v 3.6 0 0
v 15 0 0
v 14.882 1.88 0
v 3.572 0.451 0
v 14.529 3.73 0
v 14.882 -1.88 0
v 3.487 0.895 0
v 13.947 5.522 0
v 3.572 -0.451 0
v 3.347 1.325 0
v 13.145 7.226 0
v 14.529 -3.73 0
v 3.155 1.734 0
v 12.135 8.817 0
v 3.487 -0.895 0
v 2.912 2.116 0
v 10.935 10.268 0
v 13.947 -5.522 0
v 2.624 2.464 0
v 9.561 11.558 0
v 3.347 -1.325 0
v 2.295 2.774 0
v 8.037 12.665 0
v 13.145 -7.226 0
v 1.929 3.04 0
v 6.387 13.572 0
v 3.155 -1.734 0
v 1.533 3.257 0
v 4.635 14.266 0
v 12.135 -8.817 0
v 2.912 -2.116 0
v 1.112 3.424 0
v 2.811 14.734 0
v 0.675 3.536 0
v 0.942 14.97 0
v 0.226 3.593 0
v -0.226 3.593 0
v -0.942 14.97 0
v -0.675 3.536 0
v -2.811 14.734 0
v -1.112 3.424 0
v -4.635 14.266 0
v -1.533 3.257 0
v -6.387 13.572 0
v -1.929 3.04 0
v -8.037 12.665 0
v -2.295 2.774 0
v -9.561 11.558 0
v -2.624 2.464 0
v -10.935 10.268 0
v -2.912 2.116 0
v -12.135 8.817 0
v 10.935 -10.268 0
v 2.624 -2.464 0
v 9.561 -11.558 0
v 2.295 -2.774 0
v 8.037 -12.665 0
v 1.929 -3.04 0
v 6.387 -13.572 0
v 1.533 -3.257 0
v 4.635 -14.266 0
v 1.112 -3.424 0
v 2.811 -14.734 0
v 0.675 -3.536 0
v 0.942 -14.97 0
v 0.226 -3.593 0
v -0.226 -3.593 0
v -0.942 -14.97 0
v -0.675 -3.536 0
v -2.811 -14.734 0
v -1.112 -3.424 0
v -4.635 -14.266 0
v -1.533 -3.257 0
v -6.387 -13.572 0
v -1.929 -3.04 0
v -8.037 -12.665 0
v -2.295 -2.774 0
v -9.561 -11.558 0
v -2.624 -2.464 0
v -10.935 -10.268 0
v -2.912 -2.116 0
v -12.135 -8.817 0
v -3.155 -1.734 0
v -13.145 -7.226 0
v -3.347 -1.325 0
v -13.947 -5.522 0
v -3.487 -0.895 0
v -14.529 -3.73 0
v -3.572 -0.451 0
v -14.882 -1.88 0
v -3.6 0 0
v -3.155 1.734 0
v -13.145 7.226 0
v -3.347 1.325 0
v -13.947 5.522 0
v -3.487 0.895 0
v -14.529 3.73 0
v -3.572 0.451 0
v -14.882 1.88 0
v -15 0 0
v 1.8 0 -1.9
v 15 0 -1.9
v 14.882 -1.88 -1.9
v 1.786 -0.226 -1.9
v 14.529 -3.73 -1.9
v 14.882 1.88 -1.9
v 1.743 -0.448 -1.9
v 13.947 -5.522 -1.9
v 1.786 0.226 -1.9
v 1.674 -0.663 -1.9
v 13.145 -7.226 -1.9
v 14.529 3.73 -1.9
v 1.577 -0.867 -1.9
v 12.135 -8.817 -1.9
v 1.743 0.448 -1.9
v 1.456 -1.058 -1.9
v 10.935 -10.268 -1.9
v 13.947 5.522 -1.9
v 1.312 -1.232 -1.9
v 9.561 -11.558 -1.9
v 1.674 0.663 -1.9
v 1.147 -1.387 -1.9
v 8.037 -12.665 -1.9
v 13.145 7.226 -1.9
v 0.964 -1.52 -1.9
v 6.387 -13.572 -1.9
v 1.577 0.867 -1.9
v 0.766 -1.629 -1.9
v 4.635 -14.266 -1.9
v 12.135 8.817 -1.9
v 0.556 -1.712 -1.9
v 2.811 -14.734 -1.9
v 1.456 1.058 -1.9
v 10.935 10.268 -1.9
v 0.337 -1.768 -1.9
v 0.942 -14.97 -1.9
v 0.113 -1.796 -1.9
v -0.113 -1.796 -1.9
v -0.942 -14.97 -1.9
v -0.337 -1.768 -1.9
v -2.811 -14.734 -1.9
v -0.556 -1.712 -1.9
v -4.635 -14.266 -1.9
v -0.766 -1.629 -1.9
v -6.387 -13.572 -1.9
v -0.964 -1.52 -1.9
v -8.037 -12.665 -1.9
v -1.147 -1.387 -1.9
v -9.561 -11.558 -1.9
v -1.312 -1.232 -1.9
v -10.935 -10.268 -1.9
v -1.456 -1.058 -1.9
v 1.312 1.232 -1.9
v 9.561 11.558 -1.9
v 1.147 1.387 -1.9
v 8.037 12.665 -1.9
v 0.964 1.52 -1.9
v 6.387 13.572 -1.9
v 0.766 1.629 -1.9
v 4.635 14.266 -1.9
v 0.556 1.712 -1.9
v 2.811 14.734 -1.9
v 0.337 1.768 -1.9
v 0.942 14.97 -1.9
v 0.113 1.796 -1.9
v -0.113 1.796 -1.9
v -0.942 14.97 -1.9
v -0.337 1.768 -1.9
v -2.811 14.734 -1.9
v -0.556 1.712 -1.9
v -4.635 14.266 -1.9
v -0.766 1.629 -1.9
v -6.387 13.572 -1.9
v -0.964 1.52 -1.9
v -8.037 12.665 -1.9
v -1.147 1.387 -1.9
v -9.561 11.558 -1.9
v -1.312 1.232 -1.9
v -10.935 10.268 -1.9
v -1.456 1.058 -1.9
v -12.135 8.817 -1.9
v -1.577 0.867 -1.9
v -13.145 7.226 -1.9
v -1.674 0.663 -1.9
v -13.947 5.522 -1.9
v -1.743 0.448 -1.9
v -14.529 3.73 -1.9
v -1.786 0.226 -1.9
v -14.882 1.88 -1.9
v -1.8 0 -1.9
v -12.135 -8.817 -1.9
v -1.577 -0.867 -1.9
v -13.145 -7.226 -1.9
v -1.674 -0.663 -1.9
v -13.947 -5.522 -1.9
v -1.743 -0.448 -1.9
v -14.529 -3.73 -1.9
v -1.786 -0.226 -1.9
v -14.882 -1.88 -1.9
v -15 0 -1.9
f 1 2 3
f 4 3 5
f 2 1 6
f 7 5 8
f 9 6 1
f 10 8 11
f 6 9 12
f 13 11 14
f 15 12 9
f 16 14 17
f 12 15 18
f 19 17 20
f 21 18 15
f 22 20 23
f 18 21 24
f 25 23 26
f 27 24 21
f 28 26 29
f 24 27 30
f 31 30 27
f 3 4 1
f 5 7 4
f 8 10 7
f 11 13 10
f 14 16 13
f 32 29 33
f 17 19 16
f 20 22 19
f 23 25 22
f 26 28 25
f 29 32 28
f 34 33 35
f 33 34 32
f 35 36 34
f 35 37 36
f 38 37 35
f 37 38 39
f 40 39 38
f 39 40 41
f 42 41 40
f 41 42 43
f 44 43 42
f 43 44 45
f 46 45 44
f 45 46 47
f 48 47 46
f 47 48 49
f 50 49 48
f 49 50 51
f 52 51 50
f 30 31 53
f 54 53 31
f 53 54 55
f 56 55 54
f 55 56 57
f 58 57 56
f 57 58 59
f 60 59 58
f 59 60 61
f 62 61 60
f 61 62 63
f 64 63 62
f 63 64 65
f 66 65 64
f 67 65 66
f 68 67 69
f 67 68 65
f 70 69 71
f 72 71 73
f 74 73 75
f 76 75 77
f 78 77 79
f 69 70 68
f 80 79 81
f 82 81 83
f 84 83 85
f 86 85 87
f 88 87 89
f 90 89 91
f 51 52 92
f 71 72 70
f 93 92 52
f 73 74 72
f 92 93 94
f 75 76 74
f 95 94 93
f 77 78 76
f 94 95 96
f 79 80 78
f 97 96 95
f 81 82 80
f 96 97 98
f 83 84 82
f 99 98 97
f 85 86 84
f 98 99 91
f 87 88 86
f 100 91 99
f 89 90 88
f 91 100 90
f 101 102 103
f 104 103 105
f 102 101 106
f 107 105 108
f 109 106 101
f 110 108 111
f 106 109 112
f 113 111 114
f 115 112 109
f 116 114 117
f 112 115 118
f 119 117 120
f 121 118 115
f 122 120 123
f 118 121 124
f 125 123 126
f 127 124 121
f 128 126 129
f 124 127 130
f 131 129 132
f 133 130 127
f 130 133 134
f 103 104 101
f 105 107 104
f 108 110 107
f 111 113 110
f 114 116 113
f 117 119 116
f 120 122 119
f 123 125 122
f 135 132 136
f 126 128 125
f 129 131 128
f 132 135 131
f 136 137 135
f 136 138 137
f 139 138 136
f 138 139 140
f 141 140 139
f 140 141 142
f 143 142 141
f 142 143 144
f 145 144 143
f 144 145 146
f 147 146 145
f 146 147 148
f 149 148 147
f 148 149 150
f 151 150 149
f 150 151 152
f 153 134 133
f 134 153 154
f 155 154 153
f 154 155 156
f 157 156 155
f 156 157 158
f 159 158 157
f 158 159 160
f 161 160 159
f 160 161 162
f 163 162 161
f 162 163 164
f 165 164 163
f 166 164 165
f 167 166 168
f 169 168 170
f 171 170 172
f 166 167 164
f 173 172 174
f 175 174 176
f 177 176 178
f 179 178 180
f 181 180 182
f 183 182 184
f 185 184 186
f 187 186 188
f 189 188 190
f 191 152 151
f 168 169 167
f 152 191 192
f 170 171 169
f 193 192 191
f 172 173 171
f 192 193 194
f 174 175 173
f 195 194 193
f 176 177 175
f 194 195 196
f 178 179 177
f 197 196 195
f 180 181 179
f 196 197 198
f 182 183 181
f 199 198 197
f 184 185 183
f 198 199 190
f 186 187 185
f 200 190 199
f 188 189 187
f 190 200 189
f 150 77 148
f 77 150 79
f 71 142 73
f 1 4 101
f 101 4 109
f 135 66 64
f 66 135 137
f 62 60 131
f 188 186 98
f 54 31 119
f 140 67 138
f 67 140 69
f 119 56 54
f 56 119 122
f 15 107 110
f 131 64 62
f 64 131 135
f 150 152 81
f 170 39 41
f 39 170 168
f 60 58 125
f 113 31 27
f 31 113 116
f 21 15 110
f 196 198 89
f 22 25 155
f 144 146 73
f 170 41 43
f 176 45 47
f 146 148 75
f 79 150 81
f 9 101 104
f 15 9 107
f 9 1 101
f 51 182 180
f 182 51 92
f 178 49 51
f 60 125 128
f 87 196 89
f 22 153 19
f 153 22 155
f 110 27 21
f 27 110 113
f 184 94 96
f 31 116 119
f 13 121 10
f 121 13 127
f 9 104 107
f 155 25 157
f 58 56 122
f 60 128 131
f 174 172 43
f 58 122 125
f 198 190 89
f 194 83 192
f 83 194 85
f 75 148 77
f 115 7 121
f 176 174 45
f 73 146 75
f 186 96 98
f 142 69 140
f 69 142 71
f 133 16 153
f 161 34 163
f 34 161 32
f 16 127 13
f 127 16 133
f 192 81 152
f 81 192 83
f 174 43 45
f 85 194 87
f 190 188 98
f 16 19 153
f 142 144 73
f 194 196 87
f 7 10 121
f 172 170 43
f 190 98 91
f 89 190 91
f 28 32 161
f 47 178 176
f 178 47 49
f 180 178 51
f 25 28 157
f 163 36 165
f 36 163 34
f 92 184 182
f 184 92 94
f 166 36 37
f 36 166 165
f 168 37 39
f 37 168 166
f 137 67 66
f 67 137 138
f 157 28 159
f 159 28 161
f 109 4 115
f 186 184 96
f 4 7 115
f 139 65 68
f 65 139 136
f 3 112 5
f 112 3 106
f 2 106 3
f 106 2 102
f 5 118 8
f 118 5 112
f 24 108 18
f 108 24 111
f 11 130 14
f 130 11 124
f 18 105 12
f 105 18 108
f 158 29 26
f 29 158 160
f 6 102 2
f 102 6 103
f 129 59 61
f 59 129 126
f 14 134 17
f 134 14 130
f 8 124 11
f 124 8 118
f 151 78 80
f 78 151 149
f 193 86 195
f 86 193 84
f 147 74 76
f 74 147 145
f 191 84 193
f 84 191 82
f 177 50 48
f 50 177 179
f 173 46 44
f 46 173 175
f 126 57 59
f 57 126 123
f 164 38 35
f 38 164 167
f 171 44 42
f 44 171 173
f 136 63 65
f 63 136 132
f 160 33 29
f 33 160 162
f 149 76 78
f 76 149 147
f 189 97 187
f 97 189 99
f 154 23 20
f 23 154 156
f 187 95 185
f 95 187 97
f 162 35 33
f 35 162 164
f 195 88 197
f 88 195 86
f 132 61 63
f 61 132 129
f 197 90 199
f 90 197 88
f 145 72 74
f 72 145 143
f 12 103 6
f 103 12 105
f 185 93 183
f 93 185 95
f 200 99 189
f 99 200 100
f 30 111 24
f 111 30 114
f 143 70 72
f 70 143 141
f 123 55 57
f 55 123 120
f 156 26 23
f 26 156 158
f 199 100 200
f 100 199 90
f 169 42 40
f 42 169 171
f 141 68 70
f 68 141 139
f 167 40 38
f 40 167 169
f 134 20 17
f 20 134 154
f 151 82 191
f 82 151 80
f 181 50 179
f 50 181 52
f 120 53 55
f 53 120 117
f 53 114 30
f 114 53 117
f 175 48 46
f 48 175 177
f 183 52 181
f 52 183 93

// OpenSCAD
$fn = 50;


difference() {
	union() {
		translate(v = [0, 0, -1.9000000000]) {
			cylinder(h = 1.9000000000, r = 15.0000000000);
		}
	}
	union() {
		translate(v = [0, 0, 0]) {
			rotate(a = [0, 0, 0]) {
				difference() {
					union() {
						translate(v = [0, 0, -1.9000000000]) {
							cylinder(h = 1.9000000000, r = 1.5000000000);
						}
						translate(v = [0, 0, -1.9000000000]) {
							cylinder(h = 1.9000000000, r1 = 1.8000000000, r2 = 3.6000000000);
						}
						translate(v = [0, 0, -1.9000000000]) {
							cylinder(h = 1.9000000000, r = 1.8000000000);
						}
						translate(v = [0, 0, -1.9000000000]) {
							cylinder(h = 1.9000000000, r = 1.5000000000);
						}
					}
					union();
				}
			}
		}
	}
}
